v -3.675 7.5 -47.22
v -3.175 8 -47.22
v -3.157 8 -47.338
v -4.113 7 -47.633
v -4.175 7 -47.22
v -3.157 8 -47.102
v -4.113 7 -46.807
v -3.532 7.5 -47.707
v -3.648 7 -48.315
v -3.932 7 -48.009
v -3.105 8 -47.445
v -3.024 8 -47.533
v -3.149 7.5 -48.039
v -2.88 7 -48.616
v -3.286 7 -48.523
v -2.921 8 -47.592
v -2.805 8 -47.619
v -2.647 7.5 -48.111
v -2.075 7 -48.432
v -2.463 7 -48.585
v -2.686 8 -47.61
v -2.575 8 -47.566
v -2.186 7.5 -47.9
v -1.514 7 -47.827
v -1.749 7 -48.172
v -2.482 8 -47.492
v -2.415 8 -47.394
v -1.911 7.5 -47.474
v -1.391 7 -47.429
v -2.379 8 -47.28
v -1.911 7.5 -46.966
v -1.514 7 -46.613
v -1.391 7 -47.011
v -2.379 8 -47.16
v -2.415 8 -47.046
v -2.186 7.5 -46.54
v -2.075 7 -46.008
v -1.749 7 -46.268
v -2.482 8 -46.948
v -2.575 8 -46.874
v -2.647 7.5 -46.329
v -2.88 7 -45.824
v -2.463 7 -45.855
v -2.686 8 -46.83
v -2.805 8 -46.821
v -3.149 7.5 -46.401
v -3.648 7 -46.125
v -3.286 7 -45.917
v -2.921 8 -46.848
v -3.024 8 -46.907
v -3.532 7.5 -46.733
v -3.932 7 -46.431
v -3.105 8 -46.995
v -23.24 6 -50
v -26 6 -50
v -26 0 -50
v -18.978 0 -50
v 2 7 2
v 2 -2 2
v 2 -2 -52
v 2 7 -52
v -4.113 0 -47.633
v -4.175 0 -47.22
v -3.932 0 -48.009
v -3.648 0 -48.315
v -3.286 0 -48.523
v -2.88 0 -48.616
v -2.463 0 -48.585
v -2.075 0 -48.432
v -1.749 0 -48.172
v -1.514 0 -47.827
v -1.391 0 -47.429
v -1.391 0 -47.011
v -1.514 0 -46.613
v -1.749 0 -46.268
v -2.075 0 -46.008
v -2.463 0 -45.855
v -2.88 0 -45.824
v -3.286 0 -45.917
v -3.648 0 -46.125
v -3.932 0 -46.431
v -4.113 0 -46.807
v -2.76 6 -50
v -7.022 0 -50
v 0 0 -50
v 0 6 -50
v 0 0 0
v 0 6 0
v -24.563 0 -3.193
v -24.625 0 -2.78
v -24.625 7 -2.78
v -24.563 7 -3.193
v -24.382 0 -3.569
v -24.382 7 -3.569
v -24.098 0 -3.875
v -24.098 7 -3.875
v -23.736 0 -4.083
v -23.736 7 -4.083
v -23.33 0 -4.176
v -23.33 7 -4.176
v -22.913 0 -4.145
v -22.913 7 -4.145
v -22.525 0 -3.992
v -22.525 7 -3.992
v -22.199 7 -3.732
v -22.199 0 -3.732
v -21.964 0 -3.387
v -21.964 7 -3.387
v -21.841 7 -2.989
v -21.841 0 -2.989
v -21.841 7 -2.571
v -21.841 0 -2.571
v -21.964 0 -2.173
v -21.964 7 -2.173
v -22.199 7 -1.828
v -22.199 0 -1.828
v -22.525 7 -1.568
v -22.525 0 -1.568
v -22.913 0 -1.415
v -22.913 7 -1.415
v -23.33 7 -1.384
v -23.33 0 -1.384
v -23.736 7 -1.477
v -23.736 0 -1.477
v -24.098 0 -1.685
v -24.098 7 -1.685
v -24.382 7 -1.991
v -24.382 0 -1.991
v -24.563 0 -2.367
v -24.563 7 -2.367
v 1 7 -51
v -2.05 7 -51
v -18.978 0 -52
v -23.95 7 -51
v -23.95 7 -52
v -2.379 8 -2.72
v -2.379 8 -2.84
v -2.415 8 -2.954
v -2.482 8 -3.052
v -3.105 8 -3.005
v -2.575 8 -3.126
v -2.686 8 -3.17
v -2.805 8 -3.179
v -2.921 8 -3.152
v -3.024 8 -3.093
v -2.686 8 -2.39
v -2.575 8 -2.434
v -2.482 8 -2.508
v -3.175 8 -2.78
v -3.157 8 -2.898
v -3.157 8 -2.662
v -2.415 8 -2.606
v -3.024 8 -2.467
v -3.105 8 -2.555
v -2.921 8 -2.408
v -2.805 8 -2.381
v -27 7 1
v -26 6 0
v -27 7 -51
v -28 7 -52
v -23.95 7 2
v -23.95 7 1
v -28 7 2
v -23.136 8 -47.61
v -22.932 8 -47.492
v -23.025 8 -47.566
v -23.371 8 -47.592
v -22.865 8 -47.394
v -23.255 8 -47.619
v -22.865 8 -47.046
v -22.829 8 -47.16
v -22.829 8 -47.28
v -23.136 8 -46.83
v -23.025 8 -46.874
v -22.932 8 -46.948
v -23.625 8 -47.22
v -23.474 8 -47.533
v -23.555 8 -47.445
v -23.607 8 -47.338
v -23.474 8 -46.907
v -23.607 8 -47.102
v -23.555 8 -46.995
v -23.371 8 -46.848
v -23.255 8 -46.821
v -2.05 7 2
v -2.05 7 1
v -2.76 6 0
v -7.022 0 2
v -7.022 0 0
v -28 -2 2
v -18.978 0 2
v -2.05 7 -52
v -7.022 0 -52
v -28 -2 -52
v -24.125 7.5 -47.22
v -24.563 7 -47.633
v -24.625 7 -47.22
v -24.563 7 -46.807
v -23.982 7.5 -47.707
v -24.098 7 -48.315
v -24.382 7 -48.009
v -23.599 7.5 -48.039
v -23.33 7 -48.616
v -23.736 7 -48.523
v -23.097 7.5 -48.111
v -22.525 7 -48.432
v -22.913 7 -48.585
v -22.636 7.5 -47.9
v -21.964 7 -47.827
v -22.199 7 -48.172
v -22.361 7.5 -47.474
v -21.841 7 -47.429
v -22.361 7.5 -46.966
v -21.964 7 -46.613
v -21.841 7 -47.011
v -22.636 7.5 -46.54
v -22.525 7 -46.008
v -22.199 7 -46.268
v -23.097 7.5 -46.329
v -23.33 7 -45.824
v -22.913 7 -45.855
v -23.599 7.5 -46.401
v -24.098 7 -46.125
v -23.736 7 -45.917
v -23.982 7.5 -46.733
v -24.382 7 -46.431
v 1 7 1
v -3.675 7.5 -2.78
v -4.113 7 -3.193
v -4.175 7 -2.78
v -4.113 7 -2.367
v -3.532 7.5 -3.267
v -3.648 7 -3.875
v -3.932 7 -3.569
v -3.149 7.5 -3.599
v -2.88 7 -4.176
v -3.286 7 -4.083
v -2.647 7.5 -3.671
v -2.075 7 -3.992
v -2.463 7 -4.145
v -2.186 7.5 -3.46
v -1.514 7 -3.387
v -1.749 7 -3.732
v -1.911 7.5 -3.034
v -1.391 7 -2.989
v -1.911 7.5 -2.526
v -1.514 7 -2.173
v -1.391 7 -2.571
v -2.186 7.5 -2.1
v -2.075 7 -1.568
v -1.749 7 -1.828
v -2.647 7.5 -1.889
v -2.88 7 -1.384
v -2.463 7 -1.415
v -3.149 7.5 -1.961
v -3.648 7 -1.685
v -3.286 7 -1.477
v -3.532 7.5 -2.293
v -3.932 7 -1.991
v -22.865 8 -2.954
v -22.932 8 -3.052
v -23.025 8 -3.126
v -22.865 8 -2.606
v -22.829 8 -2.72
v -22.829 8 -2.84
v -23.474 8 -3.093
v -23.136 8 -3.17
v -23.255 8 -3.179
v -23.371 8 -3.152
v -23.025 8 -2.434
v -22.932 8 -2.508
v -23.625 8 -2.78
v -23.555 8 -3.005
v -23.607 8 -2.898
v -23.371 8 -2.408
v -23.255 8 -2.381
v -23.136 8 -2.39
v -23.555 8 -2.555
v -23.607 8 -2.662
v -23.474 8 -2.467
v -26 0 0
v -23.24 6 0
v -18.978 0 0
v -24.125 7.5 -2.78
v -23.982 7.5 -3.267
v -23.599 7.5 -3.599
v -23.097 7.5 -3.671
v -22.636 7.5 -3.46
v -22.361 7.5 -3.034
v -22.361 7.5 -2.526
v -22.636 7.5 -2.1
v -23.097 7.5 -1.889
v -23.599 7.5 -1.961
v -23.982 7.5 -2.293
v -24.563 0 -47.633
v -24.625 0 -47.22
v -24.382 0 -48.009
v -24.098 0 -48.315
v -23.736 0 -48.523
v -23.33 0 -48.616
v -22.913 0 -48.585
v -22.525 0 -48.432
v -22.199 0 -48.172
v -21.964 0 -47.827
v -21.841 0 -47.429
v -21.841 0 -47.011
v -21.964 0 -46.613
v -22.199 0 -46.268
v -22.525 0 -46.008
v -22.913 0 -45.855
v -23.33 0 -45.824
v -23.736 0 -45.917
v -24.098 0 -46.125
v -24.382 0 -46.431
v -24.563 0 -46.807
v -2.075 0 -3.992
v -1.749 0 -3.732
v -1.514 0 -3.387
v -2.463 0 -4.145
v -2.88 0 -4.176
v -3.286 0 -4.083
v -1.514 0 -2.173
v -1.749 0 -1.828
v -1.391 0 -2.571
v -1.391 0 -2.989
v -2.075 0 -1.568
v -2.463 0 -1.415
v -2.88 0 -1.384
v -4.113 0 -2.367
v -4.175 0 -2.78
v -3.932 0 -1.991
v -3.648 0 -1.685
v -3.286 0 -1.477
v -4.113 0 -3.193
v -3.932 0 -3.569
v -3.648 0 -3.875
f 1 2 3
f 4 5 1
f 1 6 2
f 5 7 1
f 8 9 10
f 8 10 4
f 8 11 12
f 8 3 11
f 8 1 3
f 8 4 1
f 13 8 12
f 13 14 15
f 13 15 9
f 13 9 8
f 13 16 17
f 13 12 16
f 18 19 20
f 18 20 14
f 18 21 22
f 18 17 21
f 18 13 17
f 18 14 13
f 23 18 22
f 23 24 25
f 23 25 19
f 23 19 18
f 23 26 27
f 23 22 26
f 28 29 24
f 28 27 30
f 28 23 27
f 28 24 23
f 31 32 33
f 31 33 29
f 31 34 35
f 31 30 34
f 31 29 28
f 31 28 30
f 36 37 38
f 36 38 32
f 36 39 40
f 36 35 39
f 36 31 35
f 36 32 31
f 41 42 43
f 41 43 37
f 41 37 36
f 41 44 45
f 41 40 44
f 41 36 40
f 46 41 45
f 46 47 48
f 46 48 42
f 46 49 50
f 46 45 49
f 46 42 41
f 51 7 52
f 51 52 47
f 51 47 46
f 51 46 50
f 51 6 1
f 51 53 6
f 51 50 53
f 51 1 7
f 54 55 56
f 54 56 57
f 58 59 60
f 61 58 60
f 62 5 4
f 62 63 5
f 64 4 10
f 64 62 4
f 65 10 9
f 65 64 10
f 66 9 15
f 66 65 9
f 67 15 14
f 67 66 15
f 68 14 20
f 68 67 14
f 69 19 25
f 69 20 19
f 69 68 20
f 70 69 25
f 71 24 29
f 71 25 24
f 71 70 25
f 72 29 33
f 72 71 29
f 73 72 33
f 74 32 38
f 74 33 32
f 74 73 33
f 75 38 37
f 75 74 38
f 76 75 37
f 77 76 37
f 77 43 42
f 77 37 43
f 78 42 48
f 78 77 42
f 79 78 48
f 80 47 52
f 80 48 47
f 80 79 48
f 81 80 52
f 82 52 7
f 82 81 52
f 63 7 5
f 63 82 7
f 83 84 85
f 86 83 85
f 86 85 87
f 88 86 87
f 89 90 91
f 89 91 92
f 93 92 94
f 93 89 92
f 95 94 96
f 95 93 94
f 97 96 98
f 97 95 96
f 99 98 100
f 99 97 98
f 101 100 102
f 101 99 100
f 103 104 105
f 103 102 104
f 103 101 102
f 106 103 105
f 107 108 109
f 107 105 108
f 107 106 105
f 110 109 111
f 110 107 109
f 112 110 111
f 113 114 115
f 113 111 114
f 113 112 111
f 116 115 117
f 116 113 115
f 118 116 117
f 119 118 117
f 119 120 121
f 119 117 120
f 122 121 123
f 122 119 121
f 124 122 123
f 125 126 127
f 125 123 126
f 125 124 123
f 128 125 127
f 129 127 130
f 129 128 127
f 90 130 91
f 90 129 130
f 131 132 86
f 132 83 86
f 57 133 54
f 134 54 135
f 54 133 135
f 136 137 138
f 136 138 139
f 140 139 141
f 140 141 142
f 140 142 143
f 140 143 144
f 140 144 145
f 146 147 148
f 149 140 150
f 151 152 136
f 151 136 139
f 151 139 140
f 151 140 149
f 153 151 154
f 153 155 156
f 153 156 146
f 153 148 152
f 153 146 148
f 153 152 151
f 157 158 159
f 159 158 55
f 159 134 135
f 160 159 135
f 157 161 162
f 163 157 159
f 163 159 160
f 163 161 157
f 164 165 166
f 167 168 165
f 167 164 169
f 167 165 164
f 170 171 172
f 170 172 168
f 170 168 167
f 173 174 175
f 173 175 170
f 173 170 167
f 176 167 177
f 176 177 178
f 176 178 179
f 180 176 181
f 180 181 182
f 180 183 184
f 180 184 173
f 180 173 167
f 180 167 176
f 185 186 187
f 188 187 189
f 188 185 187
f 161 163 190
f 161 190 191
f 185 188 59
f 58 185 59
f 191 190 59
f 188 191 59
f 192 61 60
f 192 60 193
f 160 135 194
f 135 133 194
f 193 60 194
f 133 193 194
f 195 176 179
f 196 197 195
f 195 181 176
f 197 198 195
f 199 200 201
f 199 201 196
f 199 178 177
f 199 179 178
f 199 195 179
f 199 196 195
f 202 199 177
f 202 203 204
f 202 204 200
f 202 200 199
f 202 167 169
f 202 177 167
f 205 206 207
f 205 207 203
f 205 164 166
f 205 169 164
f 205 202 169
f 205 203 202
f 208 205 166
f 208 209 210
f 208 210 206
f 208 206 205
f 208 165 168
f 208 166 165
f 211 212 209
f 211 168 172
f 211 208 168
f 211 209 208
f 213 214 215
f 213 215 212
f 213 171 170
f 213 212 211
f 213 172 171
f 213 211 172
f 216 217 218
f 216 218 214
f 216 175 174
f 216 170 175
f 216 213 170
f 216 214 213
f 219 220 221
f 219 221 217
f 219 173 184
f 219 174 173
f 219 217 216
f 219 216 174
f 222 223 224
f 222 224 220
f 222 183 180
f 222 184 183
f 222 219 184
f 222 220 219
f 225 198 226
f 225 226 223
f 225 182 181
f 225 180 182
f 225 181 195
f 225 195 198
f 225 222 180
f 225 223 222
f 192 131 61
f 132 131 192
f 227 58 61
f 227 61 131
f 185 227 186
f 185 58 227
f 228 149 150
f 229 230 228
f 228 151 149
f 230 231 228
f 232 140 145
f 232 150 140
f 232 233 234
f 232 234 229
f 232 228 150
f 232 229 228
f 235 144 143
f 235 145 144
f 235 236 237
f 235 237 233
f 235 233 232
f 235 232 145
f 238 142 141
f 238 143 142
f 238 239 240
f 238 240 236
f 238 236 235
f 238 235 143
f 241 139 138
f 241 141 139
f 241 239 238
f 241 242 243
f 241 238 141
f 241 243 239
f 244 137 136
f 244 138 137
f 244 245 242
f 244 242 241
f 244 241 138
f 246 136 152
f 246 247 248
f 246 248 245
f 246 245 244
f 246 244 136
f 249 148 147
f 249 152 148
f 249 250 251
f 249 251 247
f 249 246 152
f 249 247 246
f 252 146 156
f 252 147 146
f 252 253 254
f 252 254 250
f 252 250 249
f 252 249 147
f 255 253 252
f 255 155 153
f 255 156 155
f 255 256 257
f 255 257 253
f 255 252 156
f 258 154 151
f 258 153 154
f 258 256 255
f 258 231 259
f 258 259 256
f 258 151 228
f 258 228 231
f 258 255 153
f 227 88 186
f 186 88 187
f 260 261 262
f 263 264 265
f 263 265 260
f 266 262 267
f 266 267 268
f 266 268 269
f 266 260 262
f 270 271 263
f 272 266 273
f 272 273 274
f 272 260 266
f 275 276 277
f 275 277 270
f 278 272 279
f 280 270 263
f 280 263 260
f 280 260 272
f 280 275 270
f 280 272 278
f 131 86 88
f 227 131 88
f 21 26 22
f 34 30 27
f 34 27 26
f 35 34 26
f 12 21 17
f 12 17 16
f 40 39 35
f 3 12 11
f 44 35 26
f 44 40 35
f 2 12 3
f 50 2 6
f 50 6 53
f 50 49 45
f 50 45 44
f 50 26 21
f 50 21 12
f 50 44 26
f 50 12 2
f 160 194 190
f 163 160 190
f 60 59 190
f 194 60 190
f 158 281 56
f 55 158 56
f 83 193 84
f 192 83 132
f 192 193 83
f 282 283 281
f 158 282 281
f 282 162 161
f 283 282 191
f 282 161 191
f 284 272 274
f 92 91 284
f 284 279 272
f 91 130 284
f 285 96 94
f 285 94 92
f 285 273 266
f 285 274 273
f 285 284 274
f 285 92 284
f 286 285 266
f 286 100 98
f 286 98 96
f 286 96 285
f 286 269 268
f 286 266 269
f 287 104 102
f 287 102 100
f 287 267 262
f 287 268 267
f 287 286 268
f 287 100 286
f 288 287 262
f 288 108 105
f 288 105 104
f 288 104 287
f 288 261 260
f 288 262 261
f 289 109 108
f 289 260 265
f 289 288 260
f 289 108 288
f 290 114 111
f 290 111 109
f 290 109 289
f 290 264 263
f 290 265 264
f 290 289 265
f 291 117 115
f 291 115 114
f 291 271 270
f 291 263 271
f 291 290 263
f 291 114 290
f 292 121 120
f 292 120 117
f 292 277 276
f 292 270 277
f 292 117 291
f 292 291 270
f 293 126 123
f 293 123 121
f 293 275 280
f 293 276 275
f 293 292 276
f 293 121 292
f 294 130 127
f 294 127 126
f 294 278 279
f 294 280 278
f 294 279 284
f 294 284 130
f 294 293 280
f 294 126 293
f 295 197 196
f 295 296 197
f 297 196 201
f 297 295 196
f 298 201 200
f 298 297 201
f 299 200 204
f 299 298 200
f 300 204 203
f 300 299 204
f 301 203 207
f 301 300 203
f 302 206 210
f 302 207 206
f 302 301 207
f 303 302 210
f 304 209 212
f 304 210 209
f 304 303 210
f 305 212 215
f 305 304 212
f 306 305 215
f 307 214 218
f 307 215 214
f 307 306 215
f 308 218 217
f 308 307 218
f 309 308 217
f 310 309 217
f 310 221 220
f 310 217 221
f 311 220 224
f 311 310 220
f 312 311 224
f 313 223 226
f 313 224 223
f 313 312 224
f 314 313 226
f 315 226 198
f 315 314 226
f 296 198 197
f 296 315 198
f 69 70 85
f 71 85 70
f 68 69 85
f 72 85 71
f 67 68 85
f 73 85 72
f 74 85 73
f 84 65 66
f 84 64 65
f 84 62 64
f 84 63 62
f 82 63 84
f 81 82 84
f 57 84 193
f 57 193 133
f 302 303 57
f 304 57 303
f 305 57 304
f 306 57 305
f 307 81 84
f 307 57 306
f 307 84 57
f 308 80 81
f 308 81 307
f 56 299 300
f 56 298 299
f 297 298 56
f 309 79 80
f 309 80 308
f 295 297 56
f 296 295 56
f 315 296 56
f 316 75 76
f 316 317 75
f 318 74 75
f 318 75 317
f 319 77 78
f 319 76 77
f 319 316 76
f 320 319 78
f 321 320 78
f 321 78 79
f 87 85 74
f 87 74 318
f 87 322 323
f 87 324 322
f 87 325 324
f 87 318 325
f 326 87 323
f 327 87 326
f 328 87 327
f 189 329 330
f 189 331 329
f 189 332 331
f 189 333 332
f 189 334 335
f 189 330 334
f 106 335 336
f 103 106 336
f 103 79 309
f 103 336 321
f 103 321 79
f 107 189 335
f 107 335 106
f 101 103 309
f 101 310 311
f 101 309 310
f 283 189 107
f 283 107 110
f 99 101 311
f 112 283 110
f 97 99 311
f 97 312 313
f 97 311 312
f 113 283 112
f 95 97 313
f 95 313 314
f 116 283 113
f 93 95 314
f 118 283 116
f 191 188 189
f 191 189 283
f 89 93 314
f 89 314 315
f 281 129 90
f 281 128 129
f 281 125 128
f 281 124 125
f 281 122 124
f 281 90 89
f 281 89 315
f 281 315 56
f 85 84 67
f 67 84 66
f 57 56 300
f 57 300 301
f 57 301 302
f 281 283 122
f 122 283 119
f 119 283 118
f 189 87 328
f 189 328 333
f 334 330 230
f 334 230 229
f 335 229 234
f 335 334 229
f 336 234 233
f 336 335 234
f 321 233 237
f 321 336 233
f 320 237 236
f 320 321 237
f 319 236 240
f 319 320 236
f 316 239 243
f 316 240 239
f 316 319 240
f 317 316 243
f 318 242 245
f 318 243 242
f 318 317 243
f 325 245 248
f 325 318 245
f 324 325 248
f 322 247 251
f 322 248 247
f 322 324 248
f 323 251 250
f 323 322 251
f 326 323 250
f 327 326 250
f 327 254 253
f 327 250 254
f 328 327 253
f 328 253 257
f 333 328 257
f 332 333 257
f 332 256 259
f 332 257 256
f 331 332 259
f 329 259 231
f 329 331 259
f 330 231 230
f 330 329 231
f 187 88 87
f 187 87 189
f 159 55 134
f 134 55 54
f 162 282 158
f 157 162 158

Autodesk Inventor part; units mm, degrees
ref_plane "YZ Plane" through (0, 0, 0) normal (1, 0, 0) x (0, 1, 0)
ref_plane "XZ Plane" through (0, 0, 0) normal (0, 1, 0) x (-1, 0, 0)
ref_plane "XY Plane" through (0, 0, 0) normal (0, 0, 1) x (1, 0, 0)
sketch "Sketch1" plane through (0, 0, 0) normal (0, 1, 0) x (-1, 0, 0)
  line L0 (0, 0) -> (26, 0)
  line L1 (26, 0) -> (26, -50)
  line L2 (26, -50) -> (0, -50)
  line L3 (0, -50) -> (0, 0)
  line L4 (28, 2) -> (-2, 2)
  line L5 (-2, 2) -> (-2, -52)
  line L6 (-2, -52) -> (28, -52)
  line L7 (28, -52) -> (28, 2)
  circle A0 centre (2.775, -2.78) radius 1.4
  circle A1 centre (23.225, -2.78) radius 1.4
  line L8 (2.775, -2.78) -> (23.225, -2.78) construction
  line L9 (26, -25) -> (0, -25) construction
  circle A2 centre (2.775, -47.22) radius 1.4
  circle A3 centre (23.225, -47.22) radius 1.4
  line L10 (2.775, -47.22) -> (23.225, -47.22) construction
  point P0 (13, 0)
  point P1 (13, -2.78)
  point P2 (13, -47.22)
  dimension "d0" = 2
  dimension "d1" = 50
  dimension "d2" = 26
  dimension "d3" = 2.8
  dimension "d4" = 2.8
  dimension "d5" = 23.25
  dimension "d6" = 0
  dimension "d7" = 1.38
extrude "Extrusion1" add sketch "Sketch1" against normal blind 2 contours L0 L1 L2 L3 | L7 L6 L5 L4 | A0 | A1 | A2 | A3
extrude "Extrusion2" add sketch "Sketch1" along normal blind 7 contours L7 L6 L5 L4
extrude "Extrusion3" add sketch "Sketch1" along normal blind 8 contours A0 | A1 | A2 | A3
chamfer "Chamfer1" distance 1 angle 45 8 edges at (-1.375, 8, -2.78) (-21.825, 8, -47.22) (-13, 7, -50) (-26, 7, -25) (0, 7, -25) (-1.375, 8, -47.22) (-21.825, 8, -2.78) (-13, 7, 0)
sketch "Sketch2" plane through (-28, -2, 2) normal (0, 0, 1) x (1, 0, 0)
  line L0 (29, 9) -> (1, 9) projected
  line L1 (28, 2) -> (28, 8) projected
  line L2 (2.0702, 9) -> (28, 9)
  line L3 (28, 9) -> (28, 2)
  line L4 (28, 2) -> (2.0702, 2)
  line L5 (2.0702, 2) -> (2.0702, 9)
  line L6 (25.9502, 9) -> (20.9781, 2)
  line L7 (0, 0) -> (30, 0) projected
  line L8 (15, 0) -> (15, 8)
  line L9 (4.0498, 9) -> (9.0219, 2)
extrude "Extrusion4" cut sketch "Sketch2" against normal blind 2 contours L6 L4 L9 L0
ref_plane "Work Plane1" through (-26, 0, -25) normal (0, 0, 1) x (1, 0, 0)
mirror "Mirror1" about plane through (-26, 0, -25) normal (0, 0, 1) of "Extrusion4"
properties part number "relay board holder"
